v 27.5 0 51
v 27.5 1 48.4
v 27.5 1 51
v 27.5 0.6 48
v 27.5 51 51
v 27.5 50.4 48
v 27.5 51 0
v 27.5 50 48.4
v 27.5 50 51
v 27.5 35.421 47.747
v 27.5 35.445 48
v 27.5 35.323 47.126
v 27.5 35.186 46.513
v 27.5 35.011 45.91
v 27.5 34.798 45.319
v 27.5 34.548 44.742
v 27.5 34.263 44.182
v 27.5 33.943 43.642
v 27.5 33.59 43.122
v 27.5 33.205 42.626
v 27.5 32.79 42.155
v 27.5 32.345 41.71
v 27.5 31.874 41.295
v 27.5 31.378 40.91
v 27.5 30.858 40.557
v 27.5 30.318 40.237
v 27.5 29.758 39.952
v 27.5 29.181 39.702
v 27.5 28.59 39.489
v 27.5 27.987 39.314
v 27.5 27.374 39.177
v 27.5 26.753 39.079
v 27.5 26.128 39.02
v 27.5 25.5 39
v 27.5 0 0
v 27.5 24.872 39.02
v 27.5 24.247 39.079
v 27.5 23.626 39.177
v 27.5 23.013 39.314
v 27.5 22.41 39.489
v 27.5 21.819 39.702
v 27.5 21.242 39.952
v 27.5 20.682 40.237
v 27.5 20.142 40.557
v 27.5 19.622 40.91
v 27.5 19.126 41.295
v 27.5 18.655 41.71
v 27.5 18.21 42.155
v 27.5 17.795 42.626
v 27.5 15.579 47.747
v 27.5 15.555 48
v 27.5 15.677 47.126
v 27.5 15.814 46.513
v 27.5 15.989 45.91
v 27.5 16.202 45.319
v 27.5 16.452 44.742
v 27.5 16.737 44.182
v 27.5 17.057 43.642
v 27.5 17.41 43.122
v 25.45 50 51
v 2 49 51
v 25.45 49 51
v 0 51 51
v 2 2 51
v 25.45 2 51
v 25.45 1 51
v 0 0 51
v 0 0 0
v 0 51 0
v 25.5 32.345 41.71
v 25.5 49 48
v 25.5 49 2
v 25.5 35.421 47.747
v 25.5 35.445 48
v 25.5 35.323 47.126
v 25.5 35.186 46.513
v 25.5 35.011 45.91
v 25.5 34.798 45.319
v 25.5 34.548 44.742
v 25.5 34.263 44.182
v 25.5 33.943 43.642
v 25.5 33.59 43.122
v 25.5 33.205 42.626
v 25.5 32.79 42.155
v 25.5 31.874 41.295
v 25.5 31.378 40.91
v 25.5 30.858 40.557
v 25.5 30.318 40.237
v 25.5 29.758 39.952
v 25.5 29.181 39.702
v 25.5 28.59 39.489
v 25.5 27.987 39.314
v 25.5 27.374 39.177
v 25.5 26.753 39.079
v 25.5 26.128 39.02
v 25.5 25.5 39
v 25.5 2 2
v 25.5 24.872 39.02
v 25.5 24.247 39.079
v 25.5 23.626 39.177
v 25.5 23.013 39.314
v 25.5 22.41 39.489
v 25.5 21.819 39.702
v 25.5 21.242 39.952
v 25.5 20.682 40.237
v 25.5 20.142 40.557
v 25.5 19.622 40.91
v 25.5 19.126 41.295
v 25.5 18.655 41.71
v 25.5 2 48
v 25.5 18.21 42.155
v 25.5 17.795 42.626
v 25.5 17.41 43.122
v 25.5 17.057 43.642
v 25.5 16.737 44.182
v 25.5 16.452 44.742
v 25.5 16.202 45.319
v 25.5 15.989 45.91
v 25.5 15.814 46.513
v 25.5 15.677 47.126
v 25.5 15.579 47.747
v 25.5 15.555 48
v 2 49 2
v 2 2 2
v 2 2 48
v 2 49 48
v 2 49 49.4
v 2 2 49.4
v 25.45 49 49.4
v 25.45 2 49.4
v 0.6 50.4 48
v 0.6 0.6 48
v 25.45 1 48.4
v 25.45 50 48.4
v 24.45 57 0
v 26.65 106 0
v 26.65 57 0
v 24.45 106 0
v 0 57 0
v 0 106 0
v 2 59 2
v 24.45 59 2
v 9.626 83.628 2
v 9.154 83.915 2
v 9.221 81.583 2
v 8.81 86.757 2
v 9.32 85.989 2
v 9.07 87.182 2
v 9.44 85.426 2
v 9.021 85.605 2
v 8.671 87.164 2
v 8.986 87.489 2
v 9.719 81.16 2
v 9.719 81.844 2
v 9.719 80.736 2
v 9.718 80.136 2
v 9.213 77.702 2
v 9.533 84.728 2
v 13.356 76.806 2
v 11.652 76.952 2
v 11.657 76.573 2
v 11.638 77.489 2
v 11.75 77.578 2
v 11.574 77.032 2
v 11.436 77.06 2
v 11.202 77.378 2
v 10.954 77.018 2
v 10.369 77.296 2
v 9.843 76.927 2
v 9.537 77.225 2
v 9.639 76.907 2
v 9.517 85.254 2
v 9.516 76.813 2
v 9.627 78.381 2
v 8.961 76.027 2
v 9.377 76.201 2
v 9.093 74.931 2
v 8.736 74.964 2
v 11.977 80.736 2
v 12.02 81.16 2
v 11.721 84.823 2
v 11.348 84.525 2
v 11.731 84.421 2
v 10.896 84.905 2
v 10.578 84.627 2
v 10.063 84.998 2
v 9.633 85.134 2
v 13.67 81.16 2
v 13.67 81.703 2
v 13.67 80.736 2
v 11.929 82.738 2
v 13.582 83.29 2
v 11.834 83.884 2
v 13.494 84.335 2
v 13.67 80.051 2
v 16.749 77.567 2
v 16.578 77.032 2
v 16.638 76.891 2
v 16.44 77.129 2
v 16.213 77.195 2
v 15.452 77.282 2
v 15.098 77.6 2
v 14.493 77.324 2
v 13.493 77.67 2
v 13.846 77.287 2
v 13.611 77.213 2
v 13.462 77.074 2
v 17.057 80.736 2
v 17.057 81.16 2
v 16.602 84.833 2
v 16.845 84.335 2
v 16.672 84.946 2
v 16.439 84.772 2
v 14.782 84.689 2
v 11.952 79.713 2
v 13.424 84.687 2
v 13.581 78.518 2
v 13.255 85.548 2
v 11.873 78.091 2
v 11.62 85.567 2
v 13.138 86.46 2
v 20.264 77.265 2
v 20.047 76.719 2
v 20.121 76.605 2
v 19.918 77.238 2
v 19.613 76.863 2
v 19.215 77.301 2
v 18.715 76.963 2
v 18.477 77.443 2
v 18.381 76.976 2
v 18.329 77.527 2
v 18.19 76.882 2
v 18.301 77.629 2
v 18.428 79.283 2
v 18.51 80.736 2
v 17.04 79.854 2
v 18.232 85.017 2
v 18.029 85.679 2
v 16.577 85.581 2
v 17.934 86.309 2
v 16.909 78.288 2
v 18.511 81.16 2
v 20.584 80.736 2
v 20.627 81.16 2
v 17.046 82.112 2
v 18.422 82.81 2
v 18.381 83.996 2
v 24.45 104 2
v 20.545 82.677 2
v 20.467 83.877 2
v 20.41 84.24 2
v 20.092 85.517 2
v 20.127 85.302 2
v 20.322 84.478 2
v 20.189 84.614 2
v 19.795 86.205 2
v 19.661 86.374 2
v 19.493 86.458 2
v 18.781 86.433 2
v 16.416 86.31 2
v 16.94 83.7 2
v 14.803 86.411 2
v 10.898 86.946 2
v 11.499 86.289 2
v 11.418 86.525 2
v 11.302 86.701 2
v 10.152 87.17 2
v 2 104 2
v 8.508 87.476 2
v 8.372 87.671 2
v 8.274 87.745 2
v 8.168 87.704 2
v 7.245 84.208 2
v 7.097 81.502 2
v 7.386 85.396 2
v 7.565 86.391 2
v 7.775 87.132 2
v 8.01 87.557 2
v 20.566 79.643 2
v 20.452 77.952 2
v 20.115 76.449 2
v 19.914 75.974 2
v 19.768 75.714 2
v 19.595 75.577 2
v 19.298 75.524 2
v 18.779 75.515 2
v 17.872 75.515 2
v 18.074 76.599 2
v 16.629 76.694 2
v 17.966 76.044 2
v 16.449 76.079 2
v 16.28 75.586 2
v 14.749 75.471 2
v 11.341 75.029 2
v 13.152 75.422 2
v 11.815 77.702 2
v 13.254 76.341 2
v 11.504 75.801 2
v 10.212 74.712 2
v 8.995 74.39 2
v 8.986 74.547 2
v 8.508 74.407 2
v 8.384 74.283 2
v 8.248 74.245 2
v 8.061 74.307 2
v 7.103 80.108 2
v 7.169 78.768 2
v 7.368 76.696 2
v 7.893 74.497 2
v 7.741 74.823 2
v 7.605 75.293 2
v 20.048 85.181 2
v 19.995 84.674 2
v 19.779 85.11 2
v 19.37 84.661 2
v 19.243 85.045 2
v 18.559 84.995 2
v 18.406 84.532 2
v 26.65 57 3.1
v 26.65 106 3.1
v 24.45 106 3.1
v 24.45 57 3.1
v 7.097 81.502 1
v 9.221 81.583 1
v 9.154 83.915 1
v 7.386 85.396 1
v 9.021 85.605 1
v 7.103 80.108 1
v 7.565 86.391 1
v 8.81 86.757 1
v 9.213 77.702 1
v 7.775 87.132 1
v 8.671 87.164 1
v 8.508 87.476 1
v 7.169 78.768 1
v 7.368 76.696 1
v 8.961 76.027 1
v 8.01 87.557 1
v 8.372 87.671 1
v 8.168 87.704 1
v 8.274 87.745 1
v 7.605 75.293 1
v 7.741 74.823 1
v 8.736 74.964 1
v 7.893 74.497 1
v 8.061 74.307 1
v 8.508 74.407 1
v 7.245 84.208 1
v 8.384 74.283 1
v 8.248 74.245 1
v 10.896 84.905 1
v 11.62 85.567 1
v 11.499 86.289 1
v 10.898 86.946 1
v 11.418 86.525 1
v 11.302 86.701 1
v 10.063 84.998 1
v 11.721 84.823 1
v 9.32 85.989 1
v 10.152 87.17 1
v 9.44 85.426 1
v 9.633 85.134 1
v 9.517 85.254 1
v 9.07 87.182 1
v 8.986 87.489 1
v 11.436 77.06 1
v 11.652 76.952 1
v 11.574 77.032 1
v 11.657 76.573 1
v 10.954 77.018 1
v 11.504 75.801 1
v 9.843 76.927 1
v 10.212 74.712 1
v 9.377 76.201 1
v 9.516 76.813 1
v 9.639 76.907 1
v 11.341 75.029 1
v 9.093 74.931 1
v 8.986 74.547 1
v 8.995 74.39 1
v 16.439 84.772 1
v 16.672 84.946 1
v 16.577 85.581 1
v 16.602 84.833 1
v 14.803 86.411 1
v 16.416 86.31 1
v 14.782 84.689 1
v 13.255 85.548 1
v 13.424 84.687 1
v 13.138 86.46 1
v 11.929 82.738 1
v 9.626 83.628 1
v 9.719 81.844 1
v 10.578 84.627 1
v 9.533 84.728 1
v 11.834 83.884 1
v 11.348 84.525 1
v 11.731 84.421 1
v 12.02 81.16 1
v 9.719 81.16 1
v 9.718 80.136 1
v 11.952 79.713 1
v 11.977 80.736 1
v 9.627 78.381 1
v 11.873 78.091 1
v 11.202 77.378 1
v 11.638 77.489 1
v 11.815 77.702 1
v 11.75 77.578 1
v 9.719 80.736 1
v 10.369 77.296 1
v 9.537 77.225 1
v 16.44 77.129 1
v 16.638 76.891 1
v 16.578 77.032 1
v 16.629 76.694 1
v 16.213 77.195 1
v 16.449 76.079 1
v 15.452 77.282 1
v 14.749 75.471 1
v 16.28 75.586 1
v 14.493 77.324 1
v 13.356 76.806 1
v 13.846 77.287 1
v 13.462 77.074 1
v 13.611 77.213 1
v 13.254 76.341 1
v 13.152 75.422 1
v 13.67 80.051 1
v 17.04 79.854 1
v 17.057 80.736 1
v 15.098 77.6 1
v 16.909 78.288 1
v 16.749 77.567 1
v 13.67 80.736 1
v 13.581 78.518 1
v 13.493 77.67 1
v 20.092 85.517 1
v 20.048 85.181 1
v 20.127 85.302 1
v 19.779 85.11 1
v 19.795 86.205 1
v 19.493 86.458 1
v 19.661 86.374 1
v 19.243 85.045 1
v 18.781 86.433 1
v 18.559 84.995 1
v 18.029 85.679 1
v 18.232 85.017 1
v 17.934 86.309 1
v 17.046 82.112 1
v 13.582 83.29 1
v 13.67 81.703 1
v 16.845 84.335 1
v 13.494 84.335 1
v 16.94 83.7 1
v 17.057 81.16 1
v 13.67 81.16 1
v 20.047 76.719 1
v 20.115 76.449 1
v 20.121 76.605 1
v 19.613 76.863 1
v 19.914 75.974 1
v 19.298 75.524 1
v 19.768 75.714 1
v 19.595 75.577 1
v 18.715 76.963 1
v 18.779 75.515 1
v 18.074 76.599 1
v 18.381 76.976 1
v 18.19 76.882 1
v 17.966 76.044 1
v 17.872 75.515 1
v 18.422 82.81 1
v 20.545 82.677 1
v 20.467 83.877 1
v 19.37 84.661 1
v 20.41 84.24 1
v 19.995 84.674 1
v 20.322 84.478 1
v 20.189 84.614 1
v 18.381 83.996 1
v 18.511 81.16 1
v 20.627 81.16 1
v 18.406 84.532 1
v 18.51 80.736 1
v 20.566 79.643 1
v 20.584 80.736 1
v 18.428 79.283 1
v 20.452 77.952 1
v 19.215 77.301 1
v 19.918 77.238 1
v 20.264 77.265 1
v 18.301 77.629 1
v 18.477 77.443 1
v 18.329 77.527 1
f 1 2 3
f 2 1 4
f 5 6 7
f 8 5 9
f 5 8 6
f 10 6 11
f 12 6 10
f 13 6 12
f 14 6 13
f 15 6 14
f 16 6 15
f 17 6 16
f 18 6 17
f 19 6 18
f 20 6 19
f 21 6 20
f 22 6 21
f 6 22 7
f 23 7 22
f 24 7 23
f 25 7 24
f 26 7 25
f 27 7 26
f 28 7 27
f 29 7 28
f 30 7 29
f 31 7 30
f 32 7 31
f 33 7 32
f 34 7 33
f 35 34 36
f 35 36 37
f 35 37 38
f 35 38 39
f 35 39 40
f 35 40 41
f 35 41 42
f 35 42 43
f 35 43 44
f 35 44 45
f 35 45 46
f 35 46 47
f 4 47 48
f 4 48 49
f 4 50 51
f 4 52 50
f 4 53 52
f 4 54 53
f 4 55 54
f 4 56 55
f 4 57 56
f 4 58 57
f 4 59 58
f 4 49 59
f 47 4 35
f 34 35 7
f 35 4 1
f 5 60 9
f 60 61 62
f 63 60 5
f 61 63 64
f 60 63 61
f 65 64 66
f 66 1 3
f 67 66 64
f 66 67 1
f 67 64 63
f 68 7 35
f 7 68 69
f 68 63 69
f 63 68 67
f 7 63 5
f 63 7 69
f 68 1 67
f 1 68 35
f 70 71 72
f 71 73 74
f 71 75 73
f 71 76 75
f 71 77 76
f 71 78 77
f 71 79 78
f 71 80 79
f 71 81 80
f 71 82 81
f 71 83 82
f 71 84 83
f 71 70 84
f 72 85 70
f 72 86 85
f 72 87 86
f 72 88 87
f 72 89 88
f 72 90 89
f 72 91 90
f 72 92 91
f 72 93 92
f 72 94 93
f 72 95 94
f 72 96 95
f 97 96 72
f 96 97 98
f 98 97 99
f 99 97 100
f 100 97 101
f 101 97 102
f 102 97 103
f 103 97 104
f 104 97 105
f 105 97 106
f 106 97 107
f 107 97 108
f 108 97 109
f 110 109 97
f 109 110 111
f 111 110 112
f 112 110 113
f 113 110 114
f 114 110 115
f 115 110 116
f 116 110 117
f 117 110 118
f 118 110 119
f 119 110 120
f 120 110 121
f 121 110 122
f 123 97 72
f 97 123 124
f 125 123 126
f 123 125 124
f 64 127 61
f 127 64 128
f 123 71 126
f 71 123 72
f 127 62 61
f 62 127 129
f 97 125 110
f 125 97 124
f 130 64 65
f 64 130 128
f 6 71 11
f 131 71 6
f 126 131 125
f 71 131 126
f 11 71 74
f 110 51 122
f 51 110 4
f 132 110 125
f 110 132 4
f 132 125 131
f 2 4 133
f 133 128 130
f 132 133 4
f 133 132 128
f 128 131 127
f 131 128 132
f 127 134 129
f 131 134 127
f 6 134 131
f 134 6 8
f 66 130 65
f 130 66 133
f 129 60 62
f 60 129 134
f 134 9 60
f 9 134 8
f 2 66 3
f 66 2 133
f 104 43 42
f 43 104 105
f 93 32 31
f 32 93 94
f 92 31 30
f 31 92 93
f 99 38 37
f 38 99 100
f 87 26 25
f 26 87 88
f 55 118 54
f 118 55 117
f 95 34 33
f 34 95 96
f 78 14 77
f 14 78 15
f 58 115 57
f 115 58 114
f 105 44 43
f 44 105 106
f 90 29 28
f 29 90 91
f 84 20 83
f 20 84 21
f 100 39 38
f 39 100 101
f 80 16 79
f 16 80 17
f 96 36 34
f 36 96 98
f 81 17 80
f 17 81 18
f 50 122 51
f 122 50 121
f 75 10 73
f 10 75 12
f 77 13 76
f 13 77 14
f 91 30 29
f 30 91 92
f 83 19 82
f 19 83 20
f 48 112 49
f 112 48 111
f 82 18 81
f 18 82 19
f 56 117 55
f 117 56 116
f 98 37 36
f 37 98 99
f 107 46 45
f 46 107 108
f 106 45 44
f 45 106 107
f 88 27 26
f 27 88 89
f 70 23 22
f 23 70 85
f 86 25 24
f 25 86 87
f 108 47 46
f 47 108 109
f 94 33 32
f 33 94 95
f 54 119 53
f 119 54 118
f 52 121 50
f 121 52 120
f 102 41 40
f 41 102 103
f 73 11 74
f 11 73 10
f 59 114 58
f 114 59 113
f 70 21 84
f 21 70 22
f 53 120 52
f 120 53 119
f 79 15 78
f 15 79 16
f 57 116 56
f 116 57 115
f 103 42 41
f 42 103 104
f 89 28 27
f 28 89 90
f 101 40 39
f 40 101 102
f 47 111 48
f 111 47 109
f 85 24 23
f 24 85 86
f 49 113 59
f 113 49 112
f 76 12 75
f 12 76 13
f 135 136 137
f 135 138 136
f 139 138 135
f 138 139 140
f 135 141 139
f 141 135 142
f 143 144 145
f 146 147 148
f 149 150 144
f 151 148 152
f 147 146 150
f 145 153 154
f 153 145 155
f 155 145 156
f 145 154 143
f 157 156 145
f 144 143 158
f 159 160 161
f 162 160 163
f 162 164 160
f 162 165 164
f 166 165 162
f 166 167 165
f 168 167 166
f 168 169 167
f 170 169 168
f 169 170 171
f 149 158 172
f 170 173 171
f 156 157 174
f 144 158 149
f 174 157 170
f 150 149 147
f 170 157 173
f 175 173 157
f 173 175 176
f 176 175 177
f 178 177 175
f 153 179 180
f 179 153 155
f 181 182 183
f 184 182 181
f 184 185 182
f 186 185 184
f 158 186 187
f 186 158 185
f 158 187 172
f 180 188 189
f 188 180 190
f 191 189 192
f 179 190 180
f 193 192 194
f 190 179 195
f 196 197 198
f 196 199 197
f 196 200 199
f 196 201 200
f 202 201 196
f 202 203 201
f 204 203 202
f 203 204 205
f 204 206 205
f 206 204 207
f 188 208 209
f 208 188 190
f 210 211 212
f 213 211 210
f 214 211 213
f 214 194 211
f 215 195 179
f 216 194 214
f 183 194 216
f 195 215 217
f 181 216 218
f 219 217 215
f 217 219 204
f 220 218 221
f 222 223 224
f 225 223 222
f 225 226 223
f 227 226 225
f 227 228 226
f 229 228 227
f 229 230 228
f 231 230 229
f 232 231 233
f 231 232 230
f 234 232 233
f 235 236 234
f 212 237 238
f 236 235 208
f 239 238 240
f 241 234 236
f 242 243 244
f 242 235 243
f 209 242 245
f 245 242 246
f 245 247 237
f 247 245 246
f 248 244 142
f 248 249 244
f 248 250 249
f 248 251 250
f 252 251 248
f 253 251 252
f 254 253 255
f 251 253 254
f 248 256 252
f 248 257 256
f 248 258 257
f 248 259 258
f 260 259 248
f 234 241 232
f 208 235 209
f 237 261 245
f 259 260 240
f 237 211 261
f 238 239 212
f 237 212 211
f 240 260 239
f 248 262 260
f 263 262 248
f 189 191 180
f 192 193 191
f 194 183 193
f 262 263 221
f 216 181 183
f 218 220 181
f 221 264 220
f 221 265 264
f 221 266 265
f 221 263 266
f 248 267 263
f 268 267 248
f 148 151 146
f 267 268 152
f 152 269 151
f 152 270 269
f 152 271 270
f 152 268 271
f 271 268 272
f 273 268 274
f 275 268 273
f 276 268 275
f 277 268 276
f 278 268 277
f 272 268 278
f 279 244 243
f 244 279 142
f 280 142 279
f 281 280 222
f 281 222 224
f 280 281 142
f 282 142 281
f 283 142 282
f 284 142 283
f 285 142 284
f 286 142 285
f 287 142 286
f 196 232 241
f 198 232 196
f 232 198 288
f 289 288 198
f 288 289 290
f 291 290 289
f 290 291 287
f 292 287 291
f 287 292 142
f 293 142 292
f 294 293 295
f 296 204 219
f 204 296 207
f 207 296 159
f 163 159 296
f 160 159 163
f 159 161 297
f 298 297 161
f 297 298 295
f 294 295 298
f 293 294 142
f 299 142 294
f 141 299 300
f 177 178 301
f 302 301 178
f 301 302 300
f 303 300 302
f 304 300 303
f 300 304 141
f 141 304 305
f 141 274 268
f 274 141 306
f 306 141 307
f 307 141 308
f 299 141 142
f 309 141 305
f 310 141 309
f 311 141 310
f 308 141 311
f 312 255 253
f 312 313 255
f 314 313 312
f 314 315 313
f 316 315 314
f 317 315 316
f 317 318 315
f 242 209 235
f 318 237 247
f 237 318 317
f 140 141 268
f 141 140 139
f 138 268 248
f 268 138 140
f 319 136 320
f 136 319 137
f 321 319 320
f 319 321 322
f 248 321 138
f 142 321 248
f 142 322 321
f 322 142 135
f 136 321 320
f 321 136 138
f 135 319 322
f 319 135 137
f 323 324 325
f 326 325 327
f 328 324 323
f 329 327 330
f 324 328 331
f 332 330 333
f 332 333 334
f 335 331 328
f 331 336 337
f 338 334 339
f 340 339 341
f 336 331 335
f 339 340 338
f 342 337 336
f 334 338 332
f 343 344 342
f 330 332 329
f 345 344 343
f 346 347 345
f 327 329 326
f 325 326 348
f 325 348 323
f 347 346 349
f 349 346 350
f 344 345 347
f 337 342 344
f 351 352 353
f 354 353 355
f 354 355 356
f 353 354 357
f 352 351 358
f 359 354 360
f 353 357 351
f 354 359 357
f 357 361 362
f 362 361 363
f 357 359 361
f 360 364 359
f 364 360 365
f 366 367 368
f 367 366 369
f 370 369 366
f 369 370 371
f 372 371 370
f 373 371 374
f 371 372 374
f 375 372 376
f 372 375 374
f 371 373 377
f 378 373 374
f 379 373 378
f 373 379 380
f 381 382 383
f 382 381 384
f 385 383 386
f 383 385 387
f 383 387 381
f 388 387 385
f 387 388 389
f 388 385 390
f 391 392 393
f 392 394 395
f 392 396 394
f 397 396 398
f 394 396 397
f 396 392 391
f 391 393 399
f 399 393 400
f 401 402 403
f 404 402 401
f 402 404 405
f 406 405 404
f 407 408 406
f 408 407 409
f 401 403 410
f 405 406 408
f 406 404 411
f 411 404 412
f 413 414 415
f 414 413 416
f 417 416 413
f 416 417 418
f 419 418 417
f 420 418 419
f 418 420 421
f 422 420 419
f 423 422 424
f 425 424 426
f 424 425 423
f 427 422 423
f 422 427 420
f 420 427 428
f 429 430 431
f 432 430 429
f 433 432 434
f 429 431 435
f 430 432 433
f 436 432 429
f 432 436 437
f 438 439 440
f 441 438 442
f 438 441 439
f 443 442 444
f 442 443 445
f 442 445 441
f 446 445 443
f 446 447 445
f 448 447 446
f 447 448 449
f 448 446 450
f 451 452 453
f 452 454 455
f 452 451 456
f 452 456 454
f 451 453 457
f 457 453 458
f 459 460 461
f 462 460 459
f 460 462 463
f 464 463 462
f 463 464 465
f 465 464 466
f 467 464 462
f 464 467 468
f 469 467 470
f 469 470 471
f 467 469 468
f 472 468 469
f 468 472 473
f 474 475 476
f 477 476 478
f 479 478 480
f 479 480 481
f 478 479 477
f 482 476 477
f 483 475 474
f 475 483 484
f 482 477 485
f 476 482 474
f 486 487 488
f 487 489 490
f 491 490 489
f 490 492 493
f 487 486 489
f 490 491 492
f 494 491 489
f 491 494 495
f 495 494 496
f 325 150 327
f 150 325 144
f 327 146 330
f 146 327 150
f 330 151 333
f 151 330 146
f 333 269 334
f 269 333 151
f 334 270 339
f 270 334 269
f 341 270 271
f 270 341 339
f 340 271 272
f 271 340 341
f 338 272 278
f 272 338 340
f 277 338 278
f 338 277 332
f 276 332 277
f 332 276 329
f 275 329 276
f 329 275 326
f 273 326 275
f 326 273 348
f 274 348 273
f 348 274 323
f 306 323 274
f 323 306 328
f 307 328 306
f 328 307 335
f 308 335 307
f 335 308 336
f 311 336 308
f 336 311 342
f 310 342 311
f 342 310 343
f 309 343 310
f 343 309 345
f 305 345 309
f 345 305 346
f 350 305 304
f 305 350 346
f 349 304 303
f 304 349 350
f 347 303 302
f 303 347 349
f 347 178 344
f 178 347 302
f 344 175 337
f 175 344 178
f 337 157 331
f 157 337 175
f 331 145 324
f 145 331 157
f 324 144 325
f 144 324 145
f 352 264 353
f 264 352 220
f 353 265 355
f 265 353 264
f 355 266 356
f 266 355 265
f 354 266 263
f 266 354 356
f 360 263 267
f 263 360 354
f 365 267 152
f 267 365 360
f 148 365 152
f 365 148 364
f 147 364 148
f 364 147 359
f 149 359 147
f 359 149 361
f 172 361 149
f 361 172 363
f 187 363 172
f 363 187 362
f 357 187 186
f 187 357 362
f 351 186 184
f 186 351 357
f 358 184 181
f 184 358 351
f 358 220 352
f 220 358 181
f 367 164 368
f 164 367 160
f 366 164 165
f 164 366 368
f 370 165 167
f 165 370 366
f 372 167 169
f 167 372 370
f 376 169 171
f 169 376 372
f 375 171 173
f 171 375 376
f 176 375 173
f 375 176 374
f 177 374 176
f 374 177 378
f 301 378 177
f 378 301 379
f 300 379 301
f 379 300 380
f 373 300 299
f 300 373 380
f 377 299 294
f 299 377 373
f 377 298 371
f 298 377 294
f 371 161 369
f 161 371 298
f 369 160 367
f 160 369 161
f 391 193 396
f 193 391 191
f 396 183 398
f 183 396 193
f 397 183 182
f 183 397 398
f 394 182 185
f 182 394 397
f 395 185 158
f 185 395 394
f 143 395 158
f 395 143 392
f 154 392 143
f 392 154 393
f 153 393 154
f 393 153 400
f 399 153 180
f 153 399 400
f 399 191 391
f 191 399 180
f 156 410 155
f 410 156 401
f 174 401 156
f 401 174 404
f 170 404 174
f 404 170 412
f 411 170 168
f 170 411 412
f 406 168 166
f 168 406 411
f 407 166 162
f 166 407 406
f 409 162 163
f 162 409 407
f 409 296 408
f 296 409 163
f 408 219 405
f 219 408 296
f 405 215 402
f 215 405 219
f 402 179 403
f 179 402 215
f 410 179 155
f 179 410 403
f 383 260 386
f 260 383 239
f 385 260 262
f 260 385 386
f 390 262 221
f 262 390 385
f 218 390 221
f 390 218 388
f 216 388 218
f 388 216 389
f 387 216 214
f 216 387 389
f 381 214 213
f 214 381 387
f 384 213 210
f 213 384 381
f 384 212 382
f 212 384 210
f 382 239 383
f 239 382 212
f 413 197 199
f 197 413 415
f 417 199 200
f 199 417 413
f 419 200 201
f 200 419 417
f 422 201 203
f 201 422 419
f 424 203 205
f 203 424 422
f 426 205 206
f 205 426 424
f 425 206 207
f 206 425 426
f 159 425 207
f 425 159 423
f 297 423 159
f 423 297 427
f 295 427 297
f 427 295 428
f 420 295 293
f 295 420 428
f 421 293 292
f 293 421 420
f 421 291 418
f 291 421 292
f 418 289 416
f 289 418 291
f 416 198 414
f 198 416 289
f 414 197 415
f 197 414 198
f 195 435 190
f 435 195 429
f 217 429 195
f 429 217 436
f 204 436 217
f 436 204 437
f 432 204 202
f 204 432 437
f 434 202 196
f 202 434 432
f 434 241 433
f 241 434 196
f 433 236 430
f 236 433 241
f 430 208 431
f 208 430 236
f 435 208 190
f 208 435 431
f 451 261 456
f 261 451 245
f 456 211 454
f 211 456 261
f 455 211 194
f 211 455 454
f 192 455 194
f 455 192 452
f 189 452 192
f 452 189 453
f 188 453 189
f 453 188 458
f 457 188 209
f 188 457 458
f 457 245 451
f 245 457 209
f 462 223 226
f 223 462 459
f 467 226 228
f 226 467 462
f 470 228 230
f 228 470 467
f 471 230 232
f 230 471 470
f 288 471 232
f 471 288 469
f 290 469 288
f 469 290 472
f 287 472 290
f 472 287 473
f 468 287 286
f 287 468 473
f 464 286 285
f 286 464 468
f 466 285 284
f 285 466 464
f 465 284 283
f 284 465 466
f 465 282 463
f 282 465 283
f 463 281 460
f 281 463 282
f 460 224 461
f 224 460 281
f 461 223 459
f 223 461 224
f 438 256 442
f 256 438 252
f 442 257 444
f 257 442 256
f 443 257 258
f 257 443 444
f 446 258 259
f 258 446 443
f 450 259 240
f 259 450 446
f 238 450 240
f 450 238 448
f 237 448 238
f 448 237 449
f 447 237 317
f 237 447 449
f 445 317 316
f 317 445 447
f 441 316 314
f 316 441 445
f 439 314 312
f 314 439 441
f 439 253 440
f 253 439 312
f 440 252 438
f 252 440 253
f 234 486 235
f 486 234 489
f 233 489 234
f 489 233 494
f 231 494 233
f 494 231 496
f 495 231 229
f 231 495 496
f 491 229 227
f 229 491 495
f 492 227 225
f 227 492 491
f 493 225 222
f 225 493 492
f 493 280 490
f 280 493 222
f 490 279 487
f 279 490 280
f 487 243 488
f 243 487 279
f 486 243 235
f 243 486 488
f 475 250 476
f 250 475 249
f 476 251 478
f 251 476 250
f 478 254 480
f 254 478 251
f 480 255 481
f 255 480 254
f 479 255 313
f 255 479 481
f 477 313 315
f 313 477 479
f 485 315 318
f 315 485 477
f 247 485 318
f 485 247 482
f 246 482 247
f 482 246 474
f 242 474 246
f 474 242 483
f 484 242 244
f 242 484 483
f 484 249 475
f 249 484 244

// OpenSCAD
// file: carcassonne_box.scad
/**
 * @file carcassonne_box.scad
 * @author Conlan Wesson
 * Template for Carcossonne boxes.
 * @copyright Creative Commons Attribution-NonCommercial-ShareAlike 4.0
 */

mm = 1;
cm = 10*mm;

width = 47*mm;
thick = 2.5*mm;
wall = 2*mm;

/**
 * Lid for box.
 * @param count Number of cards.
 * @param columns Number of columns.
 * @param icon Path to icon DXF file.
 * @param rot Icon rotation in degrees.
 * @param mult Icon scale.
 * @param xoff X-offset of icon from center.
 * @param yoff Y-offset of icon from center.
 */
module carcassonne_lid(count, columns=1, icon=false, rot=0, mult=1, xoff=0, yoff=0, g=0){
	length = (thick * count) + ((width/2) - ((thick * count) % (width/2)));
	w = length+(1.5*wall)+.1;
	l = (width*columns)+wall;
	h = wall;
	d = 2;

	CubePoints = [
		[ 0-g, 0-g,   0 ],  //0
		[ w+g, 0-g,   0 ],  //1
		[ w+g, l+g,   0 ],  //2
		[ 0-g, l+g,   0 ],  //3
		[   d,   d, h+g ],  //4
		[   w,   d, h+g ],  //5
		[   w, l-d, h+g ],  //6
		[   d, l-d, h+g ]   //7
	];
	
	CubeFaces = [
		[0,1,2,3],  // bottom
		[4,5,1,0],  // front
		[7,6,5,4],  // top
		[5,6,2,1],  // right
		[6,7,3,2],  // back
		[7,4,0,3]   // left
	];
	
	
	difference(){
		union(){
			polyhedron( CubePoints, CubeFaces );
			translate([w-wall-.15,0,0]) cube([wall+.2,l, (1.5*wall)+.1]);
		}
		if(icon){
			translate([w/2+xoff,l/3+yoff,h-(wall/2)]){
				linear_extrude(height=(wall)+.1){
					rotate(rot) scale(mult) import(icon);
				}
			}
		}
	}
}

/**
 * Carcassonne card box.
 * @param count Number of cards.
 * @param dividers Array of divider positions.
 * @param columns Number of columns.
 */
module carcassonne_box(count, dividers=[], columns=1){
	length = (thick * count) + ((width/2) - ((thick * count) % (width/2)));
	difference(){
		union(){
			difference(){
				// Outer walls
				cube([length+(2*wall), (width*columns)+(2*wall), width+(2*wall)]);
				// Cavity
				translate([wall, wall, wall]){
					cube([length, width*columns, (width+wall)+.1]);
				}
			}
			// Dividers
			for(col = [0:columns-1]){
				for(div = dividers[col]){
					translate([(div*(width/2))+(wall/2), width*col+wall, 0]) cube([wall/2, width, width-(2*wall)]);
				}
				if(col > 0){
					translate([0, width*col+(wall/2), 0]) cube([length+(2*wall), wall/2, width-(2*wall)]);
				}
			}
		}
		union(){
			// Notch
			for(col = [0:columns-1]){
				translate([wall, wall+(width*col), wall]){
					translate([0, width/2, width])
					rotate([0, 90, 0]){
						cylinder(r=10, h=length+(2*wall), $fn=100);
					}
				}
			}
			// Track
			translate([wall/2,wall/2,width+wall/2]) carcassonne_lid(count, columns, g=0.4);
		}
	}
}
// main file
/**
 * @file barbersurgeons.scad
 * @author Conlan Wesson
 * The Barber-Surgeons Carcossonne box.
 * @copyright Creative Commons Attribution-NonCommercial-ShareAlike 4.0
 */

include <carcassonne_box.scad>

count = 6;
dividers = [[]];
columns = 1;

carcassonne_box(count, dividers, columns);
translate([0,width*columns+10,0]) carcassonne_lid(count, columns, icon="barbersurgeons.dxf", rot=90, mult=0.4, xoff=9, yoff=-1);
